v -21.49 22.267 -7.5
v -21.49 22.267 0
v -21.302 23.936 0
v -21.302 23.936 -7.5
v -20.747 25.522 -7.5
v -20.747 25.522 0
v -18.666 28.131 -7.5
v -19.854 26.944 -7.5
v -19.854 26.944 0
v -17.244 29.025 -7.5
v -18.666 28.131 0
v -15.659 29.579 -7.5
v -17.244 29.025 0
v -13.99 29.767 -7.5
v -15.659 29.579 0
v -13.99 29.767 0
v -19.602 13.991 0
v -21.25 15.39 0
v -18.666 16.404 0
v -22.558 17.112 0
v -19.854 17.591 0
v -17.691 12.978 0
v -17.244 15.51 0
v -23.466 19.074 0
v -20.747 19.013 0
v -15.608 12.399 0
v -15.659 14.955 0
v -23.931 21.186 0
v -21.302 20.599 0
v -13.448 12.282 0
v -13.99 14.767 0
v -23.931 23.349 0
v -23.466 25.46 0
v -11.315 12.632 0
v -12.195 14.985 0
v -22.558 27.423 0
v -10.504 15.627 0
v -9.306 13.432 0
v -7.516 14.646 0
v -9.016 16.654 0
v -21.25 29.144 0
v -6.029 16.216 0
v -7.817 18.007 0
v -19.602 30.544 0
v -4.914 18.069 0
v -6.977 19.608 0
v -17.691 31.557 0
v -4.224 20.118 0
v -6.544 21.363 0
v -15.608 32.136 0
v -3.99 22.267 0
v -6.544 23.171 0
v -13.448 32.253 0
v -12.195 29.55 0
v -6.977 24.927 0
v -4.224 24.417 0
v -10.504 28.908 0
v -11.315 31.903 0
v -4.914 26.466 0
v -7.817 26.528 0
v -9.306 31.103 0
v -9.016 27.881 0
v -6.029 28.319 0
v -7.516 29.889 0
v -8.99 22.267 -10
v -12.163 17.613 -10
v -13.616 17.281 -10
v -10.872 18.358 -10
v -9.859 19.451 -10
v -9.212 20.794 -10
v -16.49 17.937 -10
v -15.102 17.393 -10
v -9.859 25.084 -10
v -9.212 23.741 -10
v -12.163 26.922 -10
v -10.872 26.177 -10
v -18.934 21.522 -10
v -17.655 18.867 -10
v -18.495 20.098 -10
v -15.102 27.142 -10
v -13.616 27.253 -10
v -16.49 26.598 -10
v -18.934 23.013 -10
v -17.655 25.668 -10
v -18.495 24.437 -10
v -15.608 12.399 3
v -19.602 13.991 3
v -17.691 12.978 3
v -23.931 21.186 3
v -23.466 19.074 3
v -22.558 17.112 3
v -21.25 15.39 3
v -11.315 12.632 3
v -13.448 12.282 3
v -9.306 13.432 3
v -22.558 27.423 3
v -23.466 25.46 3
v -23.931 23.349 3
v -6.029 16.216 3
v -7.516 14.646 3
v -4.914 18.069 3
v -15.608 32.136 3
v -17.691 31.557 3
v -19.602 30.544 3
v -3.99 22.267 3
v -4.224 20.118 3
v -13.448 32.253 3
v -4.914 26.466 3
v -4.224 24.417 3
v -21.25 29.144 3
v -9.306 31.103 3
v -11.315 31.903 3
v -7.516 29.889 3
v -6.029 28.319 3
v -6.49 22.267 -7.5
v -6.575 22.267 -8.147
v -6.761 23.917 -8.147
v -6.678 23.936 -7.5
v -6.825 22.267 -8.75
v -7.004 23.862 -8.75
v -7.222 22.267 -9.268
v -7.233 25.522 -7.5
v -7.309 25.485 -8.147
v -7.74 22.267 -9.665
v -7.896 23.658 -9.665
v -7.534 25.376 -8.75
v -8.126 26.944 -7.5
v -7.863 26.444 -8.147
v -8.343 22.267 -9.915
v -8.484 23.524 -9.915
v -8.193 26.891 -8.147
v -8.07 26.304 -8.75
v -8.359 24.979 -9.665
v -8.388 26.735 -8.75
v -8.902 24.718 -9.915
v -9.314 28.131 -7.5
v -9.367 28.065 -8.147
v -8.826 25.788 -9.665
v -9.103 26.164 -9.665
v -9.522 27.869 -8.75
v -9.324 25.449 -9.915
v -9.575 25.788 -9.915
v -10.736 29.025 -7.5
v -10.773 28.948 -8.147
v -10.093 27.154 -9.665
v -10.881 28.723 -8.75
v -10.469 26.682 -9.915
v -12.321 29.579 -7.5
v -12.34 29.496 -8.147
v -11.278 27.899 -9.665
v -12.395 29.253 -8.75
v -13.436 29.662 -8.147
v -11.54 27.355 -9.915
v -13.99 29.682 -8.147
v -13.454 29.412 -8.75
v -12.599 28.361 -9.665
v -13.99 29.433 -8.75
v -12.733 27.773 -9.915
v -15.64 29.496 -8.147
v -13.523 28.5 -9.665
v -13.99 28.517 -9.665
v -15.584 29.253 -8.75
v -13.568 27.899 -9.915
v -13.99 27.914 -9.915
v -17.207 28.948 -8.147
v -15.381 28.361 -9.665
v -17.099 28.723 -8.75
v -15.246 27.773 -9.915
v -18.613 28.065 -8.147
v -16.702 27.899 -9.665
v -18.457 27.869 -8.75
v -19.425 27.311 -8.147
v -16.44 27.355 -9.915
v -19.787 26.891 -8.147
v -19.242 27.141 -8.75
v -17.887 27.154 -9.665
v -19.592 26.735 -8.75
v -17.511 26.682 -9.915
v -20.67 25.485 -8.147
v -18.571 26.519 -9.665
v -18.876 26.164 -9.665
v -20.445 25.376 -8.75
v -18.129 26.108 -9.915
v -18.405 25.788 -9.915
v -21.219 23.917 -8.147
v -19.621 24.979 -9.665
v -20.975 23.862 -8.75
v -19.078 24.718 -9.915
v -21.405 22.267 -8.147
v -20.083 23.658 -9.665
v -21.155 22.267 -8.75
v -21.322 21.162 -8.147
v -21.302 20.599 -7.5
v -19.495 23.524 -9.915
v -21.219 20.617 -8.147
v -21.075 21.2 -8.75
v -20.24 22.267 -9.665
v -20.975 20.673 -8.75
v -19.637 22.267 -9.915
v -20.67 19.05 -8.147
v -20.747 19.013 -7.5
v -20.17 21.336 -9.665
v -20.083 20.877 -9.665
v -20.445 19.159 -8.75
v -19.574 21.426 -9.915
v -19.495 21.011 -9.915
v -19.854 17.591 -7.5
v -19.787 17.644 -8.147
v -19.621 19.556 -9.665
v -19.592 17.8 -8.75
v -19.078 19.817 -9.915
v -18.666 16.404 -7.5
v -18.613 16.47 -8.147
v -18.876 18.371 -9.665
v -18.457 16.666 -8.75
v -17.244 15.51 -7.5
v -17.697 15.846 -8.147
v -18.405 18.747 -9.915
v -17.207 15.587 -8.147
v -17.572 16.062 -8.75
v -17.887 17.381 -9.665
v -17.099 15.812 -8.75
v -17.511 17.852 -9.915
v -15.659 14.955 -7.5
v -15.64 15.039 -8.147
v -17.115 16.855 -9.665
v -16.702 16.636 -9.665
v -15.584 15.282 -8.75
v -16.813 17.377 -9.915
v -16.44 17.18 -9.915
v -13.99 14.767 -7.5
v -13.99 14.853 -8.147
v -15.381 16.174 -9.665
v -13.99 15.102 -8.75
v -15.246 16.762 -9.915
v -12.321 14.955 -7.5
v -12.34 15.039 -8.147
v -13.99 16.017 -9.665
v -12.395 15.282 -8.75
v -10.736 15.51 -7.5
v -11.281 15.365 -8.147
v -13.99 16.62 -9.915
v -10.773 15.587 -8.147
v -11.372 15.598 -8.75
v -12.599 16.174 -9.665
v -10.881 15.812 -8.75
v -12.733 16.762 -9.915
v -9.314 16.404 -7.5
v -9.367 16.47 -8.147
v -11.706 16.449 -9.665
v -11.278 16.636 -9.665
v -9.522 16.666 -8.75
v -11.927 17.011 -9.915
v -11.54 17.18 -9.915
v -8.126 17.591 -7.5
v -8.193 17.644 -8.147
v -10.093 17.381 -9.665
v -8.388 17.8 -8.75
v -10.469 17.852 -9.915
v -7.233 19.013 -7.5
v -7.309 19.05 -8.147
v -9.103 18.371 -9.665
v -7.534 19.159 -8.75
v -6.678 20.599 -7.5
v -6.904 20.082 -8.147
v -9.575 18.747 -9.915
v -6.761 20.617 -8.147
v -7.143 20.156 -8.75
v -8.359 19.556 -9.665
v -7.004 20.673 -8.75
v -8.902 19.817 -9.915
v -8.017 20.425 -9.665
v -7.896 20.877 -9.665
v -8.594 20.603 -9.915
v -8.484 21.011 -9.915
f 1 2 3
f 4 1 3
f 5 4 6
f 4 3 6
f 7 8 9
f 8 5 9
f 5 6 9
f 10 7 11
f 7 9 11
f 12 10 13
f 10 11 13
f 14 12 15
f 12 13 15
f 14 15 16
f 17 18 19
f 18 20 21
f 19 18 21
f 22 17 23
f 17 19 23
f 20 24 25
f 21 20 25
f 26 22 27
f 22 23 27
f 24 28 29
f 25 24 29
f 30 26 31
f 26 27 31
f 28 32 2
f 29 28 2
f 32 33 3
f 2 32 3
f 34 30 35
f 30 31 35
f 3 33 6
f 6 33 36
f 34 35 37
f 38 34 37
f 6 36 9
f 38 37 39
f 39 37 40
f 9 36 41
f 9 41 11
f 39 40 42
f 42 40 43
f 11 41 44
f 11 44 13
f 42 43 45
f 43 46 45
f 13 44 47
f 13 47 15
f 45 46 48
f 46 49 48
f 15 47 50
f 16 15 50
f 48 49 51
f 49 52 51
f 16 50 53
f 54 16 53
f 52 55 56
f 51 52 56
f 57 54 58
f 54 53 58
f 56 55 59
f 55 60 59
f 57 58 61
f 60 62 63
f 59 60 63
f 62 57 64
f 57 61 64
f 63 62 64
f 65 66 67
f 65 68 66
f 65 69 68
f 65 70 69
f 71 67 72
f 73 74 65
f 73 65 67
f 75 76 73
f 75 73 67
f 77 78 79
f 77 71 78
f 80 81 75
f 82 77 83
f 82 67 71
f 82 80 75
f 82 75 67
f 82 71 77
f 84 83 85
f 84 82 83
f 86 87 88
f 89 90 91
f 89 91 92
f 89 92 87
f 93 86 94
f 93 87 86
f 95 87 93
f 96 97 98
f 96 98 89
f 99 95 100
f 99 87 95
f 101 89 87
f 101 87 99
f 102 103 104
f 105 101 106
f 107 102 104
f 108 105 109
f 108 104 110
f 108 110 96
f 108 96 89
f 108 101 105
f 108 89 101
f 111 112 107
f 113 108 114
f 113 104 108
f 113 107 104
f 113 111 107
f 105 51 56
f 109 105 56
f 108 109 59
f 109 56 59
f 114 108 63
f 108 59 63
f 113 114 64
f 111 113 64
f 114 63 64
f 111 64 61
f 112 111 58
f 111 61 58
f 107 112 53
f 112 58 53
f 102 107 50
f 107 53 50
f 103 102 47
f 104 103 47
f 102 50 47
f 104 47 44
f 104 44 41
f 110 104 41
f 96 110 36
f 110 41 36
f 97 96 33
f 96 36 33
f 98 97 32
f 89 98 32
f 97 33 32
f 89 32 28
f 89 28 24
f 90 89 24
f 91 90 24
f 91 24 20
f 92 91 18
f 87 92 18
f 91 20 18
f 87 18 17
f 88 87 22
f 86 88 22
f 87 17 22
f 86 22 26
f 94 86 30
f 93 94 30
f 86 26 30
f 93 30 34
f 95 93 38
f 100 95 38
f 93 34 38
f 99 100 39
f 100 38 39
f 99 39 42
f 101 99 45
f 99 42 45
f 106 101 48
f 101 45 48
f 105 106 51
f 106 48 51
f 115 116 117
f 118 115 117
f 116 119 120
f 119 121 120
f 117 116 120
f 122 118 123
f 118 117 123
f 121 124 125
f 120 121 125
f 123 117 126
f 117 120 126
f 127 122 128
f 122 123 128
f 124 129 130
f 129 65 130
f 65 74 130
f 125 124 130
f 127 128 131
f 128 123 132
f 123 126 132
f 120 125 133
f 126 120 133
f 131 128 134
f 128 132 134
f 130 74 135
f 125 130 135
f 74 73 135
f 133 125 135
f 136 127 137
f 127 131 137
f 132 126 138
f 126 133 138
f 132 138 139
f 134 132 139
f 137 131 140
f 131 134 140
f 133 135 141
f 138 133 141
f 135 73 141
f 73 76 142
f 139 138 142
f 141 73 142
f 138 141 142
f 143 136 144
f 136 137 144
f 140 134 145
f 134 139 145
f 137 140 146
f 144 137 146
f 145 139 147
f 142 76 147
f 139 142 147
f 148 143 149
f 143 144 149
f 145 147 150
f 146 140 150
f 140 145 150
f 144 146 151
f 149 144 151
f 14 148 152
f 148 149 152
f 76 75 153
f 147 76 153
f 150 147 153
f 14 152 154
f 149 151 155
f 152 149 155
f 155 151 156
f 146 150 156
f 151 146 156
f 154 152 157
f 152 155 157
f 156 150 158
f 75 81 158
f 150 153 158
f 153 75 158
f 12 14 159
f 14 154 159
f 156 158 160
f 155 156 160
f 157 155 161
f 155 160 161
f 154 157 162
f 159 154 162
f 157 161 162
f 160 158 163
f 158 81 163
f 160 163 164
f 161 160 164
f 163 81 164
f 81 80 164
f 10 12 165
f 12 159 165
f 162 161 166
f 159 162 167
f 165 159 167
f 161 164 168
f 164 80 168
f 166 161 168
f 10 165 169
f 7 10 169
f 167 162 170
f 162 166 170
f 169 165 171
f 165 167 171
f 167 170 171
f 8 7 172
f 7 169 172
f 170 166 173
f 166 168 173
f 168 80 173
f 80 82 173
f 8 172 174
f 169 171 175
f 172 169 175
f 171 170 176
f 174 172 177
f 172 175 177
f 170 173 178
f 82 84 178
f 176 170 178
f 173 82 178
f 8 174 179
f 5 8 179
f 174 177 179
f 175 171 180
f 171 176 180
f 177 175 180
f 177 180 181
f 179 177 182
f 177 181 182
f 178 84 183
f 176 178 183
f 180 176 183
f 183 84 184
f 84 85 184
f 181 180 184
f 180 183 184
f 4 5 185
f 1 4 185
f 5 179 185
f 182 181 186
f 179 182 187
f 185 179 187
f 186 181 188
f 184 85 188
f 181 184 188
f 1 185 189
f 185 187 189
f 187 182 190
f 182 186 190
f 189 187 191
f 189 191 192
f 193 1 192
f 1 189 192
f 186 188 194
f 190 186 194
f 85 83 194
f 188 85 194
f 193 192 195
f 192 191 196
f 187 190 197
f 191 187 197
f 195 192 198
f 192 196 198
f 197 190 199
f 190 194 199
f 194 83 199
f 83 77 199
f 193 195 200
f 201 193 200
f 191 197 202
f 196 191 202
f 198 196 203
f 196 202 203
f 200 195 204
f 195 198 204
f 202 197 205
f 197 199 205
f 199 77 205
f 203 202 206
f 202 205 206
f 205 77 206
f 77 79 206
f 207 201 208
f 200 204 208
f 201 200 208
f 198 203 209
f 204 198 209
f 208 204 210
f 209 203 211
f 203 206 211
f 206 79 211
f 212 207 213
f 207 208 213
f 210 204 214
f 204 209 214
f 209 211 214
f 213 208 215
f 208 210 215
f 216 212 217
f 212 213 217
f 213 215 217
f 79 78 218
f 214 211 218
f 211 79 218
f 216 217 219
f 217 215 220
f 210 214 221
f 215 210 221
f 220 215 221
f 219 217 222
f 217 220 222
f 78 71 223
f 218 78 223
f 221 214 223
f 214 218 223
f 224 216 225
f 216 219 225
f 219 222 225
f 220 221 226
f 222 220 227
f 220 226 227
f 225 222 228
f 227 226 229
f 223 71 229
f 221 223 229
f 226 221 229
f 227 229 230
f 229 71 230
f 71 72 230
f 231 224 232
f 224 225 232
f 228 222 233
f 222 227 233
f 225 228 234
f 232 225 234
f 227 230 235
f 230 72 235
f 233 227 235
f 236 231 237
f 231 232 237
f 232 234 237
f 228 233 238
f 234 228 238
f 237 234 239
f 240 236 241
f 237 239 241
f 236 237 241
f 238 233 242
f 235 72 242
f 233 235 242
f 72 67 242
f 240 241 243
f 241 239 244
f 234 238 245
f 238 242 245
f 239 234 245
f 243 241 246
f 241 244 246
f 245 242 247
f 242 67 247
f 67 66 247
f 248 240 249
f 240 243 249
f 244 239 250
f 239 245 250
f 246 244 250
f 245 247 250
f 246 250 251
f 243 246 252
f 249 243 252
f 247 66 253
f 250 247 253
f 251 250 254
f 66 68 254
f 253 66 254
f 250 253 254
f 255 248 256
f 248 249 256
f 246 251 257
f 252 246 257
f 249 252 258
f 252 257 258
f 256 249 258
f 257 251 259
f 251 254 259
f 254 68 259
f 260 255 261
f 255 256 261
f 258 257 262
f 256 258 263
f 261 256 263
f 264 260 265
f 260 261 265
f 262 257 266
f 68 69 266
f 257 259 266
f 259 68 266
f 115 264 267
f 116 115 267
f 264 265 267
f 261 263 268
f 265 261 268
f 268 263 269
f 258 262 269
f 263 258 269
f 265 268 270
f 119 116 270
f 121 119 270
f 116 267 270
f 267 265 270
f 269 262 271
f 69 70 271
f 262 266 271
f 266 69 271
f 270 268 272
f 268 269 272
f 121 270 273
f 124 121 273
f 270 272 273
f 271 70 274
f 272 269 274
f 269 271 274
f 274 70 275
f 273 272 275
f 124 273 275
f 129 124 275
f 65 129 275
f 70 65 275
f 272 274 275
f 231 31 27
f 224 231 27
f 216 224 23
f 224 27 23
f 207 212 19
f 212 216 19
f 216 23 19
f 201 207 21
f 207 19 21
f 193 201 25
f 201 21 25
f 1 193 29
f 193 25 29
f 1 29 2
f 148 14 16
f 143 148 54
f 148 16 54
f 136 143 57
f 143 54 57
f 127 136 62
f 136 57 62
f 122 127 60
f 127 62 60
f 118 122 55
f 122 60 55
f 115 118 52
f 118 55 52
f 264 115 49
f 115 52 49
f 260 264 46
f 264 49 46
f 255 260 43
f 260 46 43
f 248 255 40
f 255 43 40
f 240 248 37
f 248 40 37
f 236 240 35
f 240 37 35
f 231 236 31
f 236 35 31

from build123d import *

# Parameters (mm, degrees)
SKETCH1_R           = 10
BOSS_EXTRUDE3_DEPTH = 3
SKETCH3_R           = 7.5
BOSS_EXTRUDE4_DEPTH = 10
FILLET1_R           = 2.5


with BuildPart() as part:
    # Sketch1 → Boss-Extrude3 (new body)
    with BuildSketch(Plane.XY):
        with Locations((-13.989793671, 22.267450219)):
            Circle(SKETCH1_R)
    extrude(amount=BOSS_EXTRUDE3_DEPTH)

    # Sketch3 → Boss-Extrude4 (add)
    with BuildSketch(Plane(origin=(0, 0, 0), x_dir=(-1, 0, 0), z_dir=(0, 0, -1))):
        with Locations((13.989793671, 22.267450219)):
            Circle(SKETCH3_R)
    extrude(amount=BOSS_EXTRUDE4_DEPTH)

    # Fillet1
    fillet1_edges = [part.edges().sort_by_distance(p)[0] for p in [
        (-6.489793671, 22.267450219, -10),
    ]]
    fillet(fillet1_edges, radius=FILLET1_R)


solid = part.part
